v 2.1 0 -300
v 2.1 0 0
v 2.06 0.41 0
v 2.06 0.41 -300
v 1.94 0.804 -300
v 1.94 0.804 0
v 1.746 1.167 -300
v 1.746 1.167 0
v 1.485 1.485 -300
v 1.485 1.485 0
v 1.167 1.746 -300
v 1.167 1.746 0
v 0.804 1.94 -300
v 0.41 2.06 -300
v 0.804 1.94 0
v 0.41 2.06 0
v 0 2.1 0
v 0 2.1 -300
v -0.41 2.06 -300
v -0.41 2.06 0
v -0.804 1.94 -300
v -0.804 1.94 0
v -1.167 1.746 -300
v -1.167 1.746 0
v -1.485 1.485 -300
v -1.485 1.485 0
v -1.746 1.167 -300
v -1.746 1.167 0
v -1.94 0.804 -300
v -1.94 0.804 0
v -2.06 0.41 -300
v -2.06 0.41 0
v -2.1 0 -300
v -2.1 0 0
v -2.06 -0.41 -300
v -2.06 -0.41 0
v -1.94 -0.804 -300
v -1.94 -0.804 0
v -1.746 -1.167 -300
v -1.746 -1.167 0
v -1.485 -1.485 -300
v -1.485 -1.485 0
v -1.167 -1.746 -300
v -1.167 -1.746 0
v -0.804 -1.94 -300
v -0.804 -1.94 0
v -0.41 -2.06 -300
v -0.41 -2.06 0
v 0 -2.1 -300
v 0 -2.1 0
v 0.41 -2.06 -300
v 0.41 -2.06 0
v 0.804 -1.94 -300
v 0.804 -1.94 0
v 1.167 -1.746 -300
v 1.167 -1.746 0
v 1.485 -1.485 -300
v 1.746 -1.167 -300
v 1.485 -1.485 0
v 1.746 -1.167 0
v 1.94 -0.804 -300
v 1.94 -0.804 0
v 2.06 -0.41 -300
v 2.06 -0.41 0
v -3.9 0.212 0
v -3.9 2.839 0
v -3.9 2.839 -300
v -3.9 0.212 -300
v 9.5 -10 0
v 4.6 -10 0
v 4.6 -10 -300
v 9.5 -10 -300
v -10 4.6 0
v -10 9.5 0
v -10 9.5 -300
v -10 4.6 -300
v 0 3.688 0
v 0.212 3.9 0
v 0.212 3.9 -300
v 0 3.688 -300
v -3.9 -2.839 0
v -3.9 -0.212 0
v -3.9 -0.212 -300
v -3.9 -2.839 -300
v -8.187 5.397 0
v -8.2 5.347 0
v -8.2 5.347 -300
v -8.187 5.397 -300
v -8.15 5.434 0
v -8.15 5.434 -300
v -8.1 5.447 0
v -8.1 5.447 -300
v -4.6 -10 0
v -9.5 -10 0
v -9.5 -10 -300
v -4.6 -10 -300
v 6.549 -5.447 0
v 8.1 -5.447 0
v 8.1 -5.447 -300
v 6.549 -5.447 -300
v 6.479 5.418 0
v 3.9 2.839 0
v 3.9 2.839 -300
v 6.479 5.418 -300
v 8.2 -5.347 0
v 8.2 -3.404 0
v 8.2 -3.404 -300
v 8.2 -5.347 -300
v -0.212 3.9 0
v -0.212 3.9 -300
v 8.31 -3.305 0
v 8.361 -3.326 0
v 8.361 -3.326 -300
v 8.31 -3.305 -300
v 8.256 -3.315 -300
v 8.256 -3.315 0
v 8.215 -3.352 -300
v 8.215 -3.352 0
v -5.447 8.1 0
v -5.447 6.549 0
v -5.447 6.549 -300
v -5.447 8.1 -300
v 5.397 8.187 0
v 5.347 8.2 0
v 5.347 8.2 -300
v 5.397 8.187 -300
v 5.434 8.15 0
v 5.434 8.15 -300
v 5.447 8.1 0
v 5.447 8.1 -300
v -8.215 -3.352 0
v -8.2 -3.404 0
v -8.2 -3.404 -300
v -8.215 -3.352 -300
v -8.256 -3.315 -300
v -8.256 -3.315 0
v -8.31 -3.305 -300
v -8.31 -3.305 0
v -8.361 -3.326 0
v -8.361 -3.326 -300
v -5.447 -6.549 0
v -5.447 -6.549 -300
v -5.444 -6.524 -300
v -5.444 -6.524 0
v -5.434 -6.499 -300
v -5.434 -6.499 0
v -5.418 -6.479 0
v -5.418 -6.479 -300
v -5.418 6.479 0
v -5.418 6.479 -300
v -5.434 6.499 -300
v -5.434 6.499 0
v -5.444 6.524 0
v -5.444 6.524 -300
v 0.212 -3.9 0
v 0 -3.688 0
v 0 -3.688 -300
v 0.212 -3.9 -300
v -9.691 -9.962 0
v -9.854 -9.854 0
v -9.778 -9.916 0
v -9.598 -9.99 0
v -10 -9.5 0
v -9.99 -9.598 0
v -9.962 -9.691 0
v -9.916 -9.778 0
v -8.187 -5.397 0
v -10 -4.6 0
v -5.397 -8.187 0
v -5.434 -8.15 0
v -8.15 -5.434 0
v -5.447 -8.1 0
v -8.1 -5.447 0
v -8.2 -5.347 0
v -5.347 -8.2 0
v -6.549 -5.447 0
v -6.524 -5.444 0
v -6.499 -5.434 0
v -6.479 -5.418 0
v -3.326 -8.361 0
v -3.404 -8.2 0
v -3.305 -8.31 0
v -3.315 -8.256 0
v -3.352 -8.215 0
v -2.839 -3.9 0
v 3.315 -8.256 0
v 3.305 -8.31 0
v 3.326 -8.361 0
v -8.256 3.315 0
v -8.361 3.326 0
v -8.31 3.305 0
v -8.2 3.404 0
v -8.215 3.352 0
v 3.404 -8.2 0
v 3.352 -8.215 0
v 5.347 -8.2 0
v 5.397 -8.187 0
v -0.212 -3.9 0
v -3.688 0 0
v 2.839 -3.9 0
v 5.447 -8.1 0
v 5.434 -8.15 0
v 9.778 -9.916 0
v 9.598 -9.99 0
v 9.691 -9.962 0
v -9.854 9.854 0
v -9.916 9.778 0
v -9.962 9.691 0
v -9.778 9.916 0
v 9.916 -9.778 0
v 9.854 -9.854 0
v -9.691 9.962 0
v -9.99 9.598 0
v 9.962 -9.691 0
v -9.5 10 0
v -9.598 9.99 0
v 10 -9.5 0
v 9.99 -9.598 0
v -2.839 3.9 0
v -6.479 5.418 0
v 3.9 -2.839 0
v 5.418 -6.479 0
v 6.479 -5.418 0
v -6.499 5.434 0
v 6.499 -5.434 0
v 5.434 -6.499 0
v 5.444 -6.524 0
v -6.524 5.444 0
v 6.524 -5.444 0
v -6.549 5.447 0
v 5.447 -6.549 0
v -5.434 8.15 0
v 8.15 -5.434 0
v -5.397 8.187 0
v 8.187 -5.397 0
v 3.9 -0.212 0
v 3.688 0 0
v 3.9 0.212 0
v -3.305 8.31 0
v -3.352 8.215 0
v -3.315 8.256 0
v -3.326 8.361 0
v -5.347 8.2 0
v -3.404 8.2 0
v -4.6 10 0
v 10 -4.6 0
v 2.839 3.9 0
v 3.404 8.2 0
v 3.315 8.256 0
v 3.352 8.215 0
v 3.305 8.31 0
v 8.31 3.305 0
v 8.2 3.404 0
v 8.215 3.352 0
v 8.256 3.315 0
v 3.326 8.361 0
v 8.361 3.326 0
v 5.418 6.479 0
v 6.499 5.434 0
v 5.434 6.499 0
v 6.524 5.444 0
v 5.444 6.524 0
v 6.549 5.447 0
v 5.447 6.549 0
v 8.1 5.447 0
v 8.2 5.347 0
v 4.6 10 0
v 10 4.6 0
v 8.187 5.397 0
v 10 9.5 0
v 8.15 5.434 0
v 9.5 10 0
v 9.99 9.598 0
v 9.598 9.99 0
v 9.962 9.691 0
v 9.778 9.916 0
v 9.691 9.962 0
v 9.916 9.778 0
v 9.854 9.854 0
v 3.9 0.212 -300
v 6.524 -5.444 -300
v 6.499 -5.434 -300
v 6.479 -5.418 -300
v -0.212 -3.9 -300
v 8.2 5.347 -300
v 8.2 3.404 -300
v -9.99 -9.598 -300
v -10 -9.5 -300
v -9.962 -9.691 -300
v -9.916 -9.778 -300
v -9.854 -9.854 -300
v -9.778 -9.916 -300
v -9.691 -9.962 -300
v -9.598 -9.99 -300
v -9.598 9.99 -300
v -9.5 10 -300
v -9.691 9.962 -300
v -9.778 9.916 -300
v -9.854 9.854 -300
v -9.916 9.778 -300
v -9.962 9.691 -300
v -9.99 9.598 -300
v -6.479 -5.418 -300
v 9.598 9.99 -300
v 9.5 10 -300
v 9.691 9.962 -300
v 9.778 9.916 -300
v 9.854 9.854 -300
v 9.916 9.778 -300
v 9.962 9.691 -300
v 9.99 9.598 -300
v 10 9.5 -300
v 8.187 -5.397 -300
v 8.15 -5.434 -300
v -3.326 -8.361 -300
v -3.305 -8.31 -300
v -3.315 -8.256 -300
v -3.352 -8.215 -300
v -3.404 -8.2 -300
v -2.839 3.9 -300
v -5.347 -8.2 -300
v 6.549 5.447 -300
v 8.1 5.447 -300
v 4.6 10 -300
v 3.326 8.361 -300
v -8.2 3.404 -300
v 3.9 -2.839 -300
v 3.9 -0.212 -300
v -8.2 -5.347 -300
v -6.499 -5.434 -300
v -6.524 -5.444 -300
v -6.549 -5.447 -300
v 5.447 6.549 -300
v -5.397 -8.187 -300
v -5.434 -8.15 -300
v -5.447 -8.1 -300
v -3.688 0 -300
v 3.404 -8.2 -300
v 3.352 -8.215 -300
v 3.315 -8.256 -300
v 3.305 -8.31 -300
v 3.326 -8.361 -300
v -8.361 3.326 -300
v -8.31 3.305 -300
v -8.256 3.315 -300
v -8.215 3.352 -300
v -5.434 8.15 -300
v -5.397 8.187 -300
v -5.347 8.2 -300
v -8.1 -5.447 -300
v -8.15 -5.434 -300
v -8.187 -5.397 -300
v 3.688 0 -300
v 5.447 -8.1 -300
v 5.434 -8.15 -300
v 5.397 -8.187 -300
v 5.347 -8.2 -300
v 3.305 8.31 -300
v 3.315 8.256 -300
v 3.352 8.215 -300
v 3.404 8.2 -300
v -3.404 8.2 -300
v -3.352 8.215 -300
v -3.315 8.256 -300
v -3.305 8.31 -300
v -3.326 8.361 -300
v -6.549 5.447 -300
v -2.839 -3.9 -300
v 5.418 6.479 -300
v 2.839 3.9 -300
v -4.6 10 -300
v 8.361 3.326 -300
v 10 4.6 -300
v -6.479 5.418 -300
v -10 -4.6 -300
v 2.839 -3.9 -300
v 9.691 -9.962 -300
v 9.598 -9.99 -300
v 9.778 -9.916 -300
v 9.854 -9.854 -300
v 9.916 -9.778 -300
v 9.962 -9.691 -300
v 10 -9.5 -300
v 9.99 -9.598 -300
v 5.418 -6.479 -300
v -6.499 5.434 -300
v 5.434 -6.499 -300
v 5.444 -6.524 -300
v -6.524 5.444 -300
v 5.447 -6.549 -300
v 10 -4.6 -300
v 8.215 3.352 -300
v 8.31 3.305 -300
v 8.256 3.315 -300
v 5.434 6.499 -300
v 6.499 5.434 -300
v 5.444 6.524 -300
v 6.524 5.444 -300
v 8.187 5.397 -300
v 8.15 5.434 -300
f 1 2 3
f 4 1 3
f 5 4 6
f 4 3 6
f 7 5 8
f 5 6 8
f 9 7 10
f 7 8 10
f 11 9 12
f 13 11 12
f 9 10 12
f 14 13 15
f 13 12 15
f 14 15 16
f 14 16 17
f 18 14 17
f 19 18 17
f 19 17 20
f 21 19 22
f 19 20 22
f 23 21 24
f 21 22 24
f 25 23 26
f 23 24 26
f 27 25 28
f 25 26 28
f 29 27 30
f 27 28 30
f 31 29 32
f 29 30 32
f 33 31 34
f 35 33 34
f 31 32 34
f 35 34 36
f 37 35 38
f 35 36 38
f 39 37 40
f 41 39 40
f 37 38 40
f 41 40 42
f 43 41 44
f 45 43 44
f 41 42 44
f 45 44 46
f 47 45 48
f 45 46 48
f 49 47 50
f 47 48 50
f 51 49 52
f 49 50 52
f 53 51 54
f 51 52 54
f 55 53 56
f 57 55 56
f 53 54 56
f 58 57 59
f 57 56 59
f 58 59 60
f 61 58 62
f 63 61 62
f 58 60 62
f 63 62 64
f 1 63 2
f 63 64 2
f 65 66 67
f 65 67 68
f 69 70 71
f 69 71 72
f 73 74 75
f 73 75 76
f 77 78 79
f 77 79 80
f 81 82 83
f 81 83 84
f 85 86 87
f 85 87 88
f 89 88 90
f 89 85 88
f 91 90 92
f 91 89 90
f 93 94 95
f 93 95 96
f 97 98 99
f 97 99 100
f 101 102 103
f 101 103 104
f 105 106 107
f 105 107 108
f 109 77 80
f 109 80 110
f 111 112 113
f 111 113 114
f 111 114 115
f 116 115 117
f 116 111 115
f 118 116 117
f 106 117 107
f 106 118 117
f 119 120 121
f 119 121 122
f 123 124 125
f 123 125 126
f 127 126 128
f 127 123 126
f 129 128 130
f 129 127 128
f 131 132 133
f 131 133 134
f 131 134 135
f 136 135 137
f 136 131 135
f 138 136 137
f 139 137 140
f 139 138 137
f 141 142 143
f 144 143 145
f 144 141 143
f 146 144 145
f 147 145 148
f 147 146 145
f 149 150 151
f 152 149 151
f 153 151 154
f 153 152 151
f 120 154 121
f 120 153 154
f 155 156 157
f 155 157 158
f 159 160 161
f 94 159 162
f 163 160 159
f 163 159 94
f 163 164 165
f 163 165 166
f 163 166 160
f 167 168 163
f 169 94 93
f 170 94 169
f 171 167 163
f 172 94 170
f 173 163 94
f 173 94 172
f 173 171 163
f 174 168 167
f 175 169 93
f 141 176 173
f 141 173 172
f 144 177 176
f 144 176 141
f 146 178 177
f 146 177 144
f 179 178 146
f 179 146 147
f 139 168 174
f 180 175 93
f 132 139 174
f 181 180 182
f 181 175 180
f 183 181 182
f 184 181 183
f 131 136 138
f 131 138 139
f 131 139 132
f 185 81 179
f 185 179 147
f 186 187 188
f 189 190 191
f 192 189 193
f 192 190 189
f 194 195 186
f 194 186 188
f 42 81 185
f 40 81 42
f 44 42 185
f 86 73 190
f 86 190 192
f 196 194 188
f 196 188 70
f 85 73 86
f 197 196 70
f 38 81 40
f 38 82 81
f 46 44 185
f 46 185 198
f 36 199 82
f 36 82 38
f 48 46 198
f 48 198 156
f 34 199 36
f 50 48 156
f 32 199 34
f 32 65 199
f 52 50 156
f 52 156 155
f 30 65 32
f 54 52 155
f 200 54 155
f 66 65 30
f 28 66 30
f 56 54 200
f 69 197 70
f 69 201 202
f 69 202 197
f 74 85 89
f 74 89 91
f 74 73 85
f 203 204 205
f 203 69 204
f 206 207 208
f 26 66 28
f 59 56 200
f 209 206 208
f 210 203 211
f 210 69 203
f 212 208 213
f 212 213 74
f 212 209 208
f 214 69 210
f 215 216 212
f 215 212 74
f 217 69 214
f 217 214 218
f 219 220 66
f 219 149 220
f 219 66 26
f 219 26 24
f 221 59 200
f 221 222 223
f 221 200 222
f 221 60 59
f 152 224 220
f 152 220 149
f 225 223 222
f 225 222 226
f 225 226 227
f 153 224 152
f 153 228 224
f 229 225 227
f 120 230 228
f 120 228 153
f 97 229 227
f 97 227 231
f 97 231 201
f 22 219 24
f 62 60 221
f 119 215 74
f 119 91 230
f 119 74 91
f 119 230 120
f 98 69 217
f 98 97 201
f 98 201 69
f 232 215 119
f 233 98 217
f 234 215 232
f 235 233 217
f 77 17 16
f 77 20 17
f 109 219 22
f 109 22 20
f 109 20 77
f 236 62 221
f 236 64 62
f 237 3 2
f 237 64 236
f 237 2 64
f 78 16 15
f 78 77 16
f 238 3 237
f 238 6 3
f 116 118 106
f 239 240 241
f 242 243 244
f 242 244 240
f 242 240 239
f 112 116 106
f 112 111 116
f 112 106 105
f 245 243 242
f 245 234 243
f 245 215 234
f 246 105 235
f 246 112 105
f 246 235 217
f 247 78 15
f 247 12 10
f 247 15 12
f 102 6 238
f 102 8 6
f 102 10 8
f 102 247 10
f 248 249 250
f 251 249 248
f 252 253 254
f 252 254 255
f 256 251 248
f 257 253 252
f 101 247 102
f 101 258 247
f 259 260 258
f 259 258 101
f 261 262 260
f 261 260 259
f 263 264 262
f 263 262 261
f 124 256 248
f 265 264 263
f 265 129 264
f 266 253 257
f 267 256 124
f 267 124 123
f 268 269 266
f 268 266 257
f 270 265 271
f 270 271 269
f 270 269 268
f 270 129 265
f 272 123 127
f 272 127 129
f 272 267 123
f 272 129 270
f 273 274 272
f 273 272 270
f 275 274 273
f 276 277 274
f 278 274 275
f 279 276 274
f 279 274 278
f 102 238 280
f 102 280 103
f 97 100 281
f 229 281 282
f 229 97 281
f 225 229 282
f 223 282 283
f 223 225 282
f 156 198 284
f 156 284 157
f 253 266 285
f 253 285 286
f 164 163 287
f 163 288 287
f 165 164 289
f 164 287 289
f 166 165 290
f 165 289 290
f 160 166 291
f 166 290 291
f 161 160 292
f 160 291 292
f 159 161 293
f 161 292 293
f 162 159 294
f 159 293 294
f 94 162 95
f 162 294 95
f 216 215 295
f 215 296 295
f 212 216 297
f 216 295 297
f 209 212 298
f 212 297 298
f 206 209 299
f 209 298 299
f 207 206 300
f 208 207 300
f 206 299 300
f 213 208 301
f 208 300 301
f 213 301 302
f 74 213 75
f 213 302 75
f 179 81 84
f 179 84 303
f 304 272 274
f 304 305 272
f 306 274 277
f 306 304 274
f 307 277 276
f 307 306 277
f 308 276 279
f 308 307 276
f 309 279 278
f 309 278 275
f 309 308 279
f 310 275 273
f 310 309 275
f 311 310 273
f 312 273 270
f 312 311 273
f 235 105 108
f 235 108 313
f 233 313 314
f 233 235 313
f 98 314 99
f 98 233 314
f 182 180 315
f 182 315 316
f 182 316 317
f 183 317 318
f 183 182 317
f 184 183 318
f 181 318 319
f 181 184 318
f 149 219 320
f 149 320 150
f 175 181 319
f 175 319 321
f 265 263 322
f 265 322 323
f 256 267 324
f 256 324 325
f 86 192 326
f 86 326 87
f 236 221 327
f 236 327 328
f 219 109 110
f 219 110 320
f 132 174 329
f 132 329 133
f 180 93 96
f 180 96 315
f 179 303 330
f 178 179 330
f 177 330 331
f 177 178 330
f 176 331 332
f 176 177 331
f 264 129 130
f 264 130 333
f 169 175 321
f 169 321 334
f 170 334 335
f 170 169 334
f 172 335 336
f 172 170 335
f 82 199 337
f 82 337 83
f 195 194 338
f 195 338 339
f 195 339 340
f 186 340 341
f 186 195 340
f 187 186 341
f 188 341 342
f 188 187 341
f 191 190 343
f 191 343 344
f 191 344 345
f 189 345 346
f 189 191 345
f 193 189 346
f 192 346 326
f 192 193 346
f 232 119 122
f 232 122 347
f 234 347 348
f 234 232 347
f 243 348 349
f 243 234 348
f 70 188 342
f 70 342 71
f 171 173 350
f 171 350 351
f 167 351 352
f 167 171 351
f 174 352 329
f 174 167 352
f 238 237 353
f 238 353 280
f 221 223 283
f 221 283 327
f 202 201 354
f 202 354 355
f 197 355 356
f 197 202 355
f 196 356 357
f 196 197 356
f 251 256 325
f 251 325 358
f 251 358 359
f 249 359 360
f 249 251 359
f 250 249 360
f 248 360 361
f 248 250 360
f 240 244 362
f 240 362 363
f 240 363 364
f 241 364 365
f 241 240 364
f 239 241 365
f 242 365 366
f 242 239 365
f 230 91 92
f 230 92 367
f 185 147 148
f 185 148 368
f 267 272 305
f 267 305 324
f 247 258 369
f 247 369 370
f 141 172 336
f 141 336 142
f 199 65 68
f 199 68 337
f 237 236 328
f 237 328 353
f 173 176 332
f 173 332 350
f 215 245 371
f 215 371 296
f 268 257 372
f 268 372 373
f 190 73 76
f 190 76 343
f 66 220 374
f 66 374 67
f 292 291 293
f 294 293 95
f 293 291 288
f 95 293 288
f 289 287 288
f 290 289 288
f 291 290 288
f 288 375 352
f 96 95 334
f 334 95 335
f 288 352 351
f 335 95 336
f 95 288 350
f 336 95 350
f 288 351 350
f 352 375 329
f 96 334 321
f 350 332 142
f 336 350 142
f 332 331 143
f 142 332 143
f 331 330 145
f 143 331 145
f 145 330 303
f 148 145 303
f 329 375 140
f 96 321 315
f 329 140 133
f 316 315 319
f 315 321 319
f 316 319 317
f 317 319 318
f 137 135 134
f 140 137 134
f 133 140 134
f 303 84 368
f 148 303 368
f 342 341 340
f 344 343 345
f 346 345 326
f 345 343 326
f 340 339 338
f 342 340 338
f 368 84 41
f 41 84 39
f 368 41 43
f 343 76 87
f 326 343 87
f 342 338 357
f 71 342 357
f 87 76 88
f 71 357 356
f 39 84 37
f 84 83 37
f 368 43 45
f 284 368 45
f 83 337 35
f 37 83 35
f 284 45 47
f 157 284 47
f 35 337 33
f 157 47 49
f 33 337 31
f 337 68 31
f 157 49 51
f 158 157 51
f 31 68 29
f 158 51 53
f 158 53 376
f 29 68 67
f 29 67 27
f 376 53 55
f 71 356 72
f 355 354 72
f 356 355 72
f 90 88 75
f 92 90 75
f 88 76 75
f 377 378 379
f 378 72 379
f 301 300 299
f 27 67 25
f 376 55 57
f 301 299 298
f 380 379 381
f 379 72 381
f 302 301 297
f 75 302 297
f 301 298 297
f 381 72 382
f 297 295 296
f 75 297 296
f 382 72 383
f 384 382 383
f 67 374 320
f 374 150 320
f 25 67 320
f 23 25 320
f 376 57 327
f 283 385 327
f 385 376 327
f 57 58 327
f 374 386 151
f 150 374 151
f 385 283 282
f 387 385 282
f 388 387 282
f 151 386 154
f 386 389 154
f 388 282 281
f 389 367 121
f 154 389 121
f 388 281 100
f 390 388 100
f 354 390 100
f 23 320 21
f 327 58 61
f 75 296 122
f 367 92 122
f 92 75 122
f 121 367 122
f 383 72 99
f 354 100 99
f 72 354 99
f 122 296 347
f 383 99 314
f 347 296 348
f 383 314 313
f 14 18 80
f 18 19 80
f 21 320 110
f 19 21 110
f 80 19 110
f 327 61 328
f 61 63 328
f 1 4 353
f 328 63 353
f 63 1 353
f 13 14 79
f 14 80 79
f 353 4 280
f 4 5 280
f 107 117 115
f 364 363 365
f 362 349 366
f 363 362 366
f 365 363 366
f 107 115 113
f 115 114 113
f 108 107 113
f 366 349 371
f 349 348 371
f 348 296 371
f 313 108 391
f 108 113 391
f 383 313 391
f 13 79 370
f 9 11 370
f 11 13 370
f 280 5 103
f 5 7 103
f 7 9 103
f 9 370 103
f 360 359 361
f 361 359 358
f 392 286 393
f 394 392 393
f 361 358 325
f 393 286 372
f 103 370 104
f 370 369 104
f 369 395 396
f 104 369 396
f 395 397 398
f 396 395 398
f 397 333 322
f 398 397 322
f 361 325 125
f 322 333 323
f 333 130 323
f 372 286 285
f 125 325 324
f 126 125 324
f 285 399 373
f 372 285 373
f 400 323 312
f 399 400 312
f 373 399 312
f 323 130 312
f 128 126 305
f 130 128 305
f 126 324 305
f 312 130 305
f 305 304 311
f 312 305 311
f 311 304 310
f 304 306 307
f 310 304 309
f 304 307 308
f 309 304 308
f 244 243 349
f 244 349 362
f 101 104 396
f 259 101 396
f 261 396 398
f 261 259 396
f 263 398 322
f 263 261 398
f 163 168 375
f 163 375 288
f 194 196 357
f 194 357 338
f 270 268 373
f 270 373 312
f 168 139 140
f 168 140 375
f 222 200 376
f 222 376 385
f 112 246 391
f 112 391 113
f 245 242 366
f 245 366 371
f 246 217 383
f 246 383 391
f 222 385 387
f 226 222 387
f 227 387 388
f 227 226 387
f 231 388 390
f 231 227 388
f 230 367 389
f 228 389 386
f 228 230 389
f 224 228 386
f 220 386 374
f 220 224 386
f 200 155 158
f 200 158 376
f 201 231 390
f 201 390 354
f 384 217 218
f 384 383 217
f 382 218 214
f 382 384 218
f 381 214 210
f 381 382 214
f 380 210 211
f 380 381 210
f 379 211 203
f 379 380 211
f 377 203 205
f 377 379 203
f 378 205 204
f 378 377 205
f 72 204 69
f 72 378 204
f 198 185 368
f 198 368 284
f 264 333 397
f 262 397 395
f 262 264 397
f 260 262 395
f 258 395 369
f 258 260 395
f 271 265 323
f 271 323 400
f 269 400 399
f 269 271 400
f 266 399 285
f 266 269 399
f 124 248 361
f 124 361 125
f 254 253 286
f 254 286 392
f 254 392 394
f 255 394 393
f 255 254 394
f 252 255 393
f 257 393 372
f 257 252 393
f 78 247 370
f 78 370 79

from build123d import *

# Parameters (mm, degrees)
SKETCH1_R           = 2.1
BOSS_EXTRUDE1_DEPTH = 300
FILLET1_R           = 0.5


with BuildPart() as part:
    # Sketch1 → Boss-Extrude1 (new body)
    with BuildSketch(Plane.XY):
        with BuildLine():
            Line((-3.325528714, 8.361394061), (-4.6, 10))
            Line((-4.6, 10), (-10, 10))
            Line((-10, 10), (-10, 4.6))
            Line((-10, 4.6), (-8.361394061, 3.325528714))
            ThreePointArc((-8.361394061, 3.325528714), (-8.256064855, 3.31463241), (-8.2, 3.404463936))
            Line((-8.2, 3.404463936), (-8.2, 5.347413399))
            ThreePointArc((-8.2, 5.347413399), (-8.170710678, 5.418124078), (-8.1, 5.447413399))
            Line((-8.1, 5.447413399), (-6.549494927, 5.447413399))
            ThreePointArc((-6.549494927, 5.447413399), (-6.511226584, 5.439801353), (-6.478784249, 5.418124078))
            Line((-6.478784249, 5.418124078), (-3.9, 2.839339828))
            Line((-3.9, 2.839339828), (-3.9, 0.212132034))
            Line((-3.9, 0.212132034), (-3.687867966, 0))
            Line((-3.687867966, 0), (-3.9, -0.212132034))
            Line((-3.9, -0.212132034), (-3.9, -2.839339828))
            Line((-3.9, -2.839339828), (-6.478784249, -5.418124078))
            ThreePointArc((-6.478784249, -5.418124078), (-6.511226584, -5.439801353), (-6.549494927, -5.447413399))
            Line((-6.549494927, -5.447413399), (-8.1, -5.447413399))
            ThreePointArc((-8.1, -5.447413399), (-8.170710678, -5.418124078), (-8.2, -5.347413399))
            Line((-8.2, -5.347413399), (-8.2, -3.404463936))
            ThreePointArc((-8.2, -3.404463936), (-8.256064855, -3.31463241), (-8.361394061, -3.325528714))
            Line((-8.361394061, -3.325528714), (-10, -4.6))
            Line((-10, -4.6), (-10, -10))
            Line((-10, -10), (-4.6, -10))
            Line((-4.6, -10), (-3.325528714, -8.361394061))
            ThreePointArc((-3.325528714, -8.361394061), (-3.31463241, -8.256064855), (-3.404463936, -8.2))
            Line((-3.404463936, -8.2), (-5.347413399, -8.2))
            ThreePointArc((-5.347413399, -8.2), (-5.418124078, -8.170710678), (-5.447413399, -8.1))
            Line((-5.447413399, -8.1), (-5.447413399, -6.549494927))
            ThreePointArc((-5.447413399, -6.549494927), (-5.439801353, -6.511226584), (-5.418124078, -6.478784249))
            Line((-5.418124078, -6.478784249), (-2.839339828, -3.9))
            Line((-2.839339828, -3.9), (-0.212132034, -3.9))
            Line((-0.212132034, -3.9), (0, -3.687867966))
            Line((0, -3.687867966), (0.212132034, -3.9))
            Line((0.212132034, -3.9), (2.839339828, -3.9))
            Line((2.839339828, -3.9), (5.418124078, -6.478784249))
            ThreePointArc((5.418124078, -6.478784249), (5.439801353, -6.511226584), (5.447413399, -6.549494927))
            Line((5.447413399, -6.549494927), (5.447413399, -8.1))
            ThreePointArc((5.447413399, -8.1), (5.418124078, -8.170710678), (5.347413399, -8.2))
            Line((5.347413399, -8.2), (3.404463936, -8.2))
            ThreePointArc((3.404463936, -8.2), (3.31463241, -8.256064855), (3.325528714, -8.361394061))
            Line((3.325528714, -8.361394061), (4.6, -10))
            Line((4.6, -10), (10, -10))
            Line((10, -10), (10, -4.6))
            Line((10, -4.6), (8.361394061, -3.325528714))
            ThreePointArc((8.361394061, -3.325528714), (8.256064855, -3.31463241), (8.2, -3.404463936))
            Line((8.2, -3.404463936), (8.2, -5.347413399))
            ThreePointArc((8.2, -5.347413399), (8.170710678, -5.418124078), (8.1, -5.447413399))
            Line((8.1, -5.447413399), (6.549494927, -5.447413399))
            ThreePointArc((6.549494927, -5.447413399), (6.511226584, -5.439801353), (6.478784249, -5.418124078))
            Line((6.478784249, -5.418124078), (3.9, -2.839339828))
            Line((3.9, -2.839339828), (3.9, -0.212132034))
            Line((3.9, -0.212132034), (3.687867966, 0))
            Line((3.687867966, 0), (3.9, 0.212132034))
            Line((3.9, 0.212132034), (3.9, 2.839339828))
            Line((3.9, 2.839339828), (6.478784249, 5.418124078))
            ThreePointArc((6.478784249, 5.418124078), (6.511226584, 5.439801353), (6.549494927, 5.447413399))
            Line((6.549494927, 5.447413399), (8.1, 5.447413399))
            ThreePointArc((8.1, 5.447413399), (8.170710678, 5.418124078), (8.2, 5.347413399))
            Line((8.2, 5.347413399), (8.2, 3.404463936))
            ThreePointArc((8.2, 3.404463936), (8.256064855, 3.31463241), (8.361394061, 3.325528714))
            Line((8.361394061, 3.325528714), (10, 4.6))
            Line((10, 4.6), (10, 10))
            Line((10, 10), (4.6, 10))
            Line((4.6, 10), (3.325528714, 8.361394061))
            ThreePointArc((3.325528714, 8.361394061), (3.31463241, 8.256064855), (3.404463936, 8.2))
            Line((3.404463936, 8.2), (5.347413399, 8.2))
            ThreePointArc((5.347413399, 8.2), (5.418124078, 8.170710678), (5.447413399, 8.1))
            Line((5.447413399, 8.1), (5.447413399, 6.549494927))
            ThreePointArc((5.447413399, 6.549494927), (5.439801353, 6.511226584), (5.418124078, 6.478784249))
            Line((5.418124078, 6.478784249), (2.839339828, 3.9))
            Line((2.839339828, 3.9), (0.212132034, 3.9))
            Line((0.212132034, 3.9), (0, 3.687867966))
            Line((0, 3.687867966), (-0.212132034, 3.9))
            Line((-0.212132034, 3.9), (-2.839339828, 3.9))
            Line((-2.839339828, 3.9), (-5.418124078, 6.478784249))
            ThreePointArc((-5.418124078, 6.478784249), (-5.439801353, 6.511226584), (-5.447413399, 6.549494927))
            Line((-5.447413399, 6.549494927), (-5.447413399, 8.1))
            ThreePointArc((-5.447413399, 8.1), (-5.418124078, 8.170710678), (-5.347413399, 8.2))
            Line((-5.347413399, 8.2), (-3.404463936, 8.2))
            ThreePointArc((-3.404463936, 8.2), (-3.31463241, 8.256064855), (-3.325528714, 8.361394061))
        make_face()
        Circle(SKETCH1_R, mode=Mode.SUBTRACT)
    extrude(amount=-BOSS_EXTRUDE1_DEPTH)

    # Fillet1
    fillet1_edges = [part.edges().sort_by_distance(p)[0] for p in [
        (-10, -10, -150),
        (-10, 10, -150),
        (10, 10, -150),
        (10, -10, -150),
    ]]
    fillet(fillet1_edges, radius=FILLET1_R)


solid = part.part
